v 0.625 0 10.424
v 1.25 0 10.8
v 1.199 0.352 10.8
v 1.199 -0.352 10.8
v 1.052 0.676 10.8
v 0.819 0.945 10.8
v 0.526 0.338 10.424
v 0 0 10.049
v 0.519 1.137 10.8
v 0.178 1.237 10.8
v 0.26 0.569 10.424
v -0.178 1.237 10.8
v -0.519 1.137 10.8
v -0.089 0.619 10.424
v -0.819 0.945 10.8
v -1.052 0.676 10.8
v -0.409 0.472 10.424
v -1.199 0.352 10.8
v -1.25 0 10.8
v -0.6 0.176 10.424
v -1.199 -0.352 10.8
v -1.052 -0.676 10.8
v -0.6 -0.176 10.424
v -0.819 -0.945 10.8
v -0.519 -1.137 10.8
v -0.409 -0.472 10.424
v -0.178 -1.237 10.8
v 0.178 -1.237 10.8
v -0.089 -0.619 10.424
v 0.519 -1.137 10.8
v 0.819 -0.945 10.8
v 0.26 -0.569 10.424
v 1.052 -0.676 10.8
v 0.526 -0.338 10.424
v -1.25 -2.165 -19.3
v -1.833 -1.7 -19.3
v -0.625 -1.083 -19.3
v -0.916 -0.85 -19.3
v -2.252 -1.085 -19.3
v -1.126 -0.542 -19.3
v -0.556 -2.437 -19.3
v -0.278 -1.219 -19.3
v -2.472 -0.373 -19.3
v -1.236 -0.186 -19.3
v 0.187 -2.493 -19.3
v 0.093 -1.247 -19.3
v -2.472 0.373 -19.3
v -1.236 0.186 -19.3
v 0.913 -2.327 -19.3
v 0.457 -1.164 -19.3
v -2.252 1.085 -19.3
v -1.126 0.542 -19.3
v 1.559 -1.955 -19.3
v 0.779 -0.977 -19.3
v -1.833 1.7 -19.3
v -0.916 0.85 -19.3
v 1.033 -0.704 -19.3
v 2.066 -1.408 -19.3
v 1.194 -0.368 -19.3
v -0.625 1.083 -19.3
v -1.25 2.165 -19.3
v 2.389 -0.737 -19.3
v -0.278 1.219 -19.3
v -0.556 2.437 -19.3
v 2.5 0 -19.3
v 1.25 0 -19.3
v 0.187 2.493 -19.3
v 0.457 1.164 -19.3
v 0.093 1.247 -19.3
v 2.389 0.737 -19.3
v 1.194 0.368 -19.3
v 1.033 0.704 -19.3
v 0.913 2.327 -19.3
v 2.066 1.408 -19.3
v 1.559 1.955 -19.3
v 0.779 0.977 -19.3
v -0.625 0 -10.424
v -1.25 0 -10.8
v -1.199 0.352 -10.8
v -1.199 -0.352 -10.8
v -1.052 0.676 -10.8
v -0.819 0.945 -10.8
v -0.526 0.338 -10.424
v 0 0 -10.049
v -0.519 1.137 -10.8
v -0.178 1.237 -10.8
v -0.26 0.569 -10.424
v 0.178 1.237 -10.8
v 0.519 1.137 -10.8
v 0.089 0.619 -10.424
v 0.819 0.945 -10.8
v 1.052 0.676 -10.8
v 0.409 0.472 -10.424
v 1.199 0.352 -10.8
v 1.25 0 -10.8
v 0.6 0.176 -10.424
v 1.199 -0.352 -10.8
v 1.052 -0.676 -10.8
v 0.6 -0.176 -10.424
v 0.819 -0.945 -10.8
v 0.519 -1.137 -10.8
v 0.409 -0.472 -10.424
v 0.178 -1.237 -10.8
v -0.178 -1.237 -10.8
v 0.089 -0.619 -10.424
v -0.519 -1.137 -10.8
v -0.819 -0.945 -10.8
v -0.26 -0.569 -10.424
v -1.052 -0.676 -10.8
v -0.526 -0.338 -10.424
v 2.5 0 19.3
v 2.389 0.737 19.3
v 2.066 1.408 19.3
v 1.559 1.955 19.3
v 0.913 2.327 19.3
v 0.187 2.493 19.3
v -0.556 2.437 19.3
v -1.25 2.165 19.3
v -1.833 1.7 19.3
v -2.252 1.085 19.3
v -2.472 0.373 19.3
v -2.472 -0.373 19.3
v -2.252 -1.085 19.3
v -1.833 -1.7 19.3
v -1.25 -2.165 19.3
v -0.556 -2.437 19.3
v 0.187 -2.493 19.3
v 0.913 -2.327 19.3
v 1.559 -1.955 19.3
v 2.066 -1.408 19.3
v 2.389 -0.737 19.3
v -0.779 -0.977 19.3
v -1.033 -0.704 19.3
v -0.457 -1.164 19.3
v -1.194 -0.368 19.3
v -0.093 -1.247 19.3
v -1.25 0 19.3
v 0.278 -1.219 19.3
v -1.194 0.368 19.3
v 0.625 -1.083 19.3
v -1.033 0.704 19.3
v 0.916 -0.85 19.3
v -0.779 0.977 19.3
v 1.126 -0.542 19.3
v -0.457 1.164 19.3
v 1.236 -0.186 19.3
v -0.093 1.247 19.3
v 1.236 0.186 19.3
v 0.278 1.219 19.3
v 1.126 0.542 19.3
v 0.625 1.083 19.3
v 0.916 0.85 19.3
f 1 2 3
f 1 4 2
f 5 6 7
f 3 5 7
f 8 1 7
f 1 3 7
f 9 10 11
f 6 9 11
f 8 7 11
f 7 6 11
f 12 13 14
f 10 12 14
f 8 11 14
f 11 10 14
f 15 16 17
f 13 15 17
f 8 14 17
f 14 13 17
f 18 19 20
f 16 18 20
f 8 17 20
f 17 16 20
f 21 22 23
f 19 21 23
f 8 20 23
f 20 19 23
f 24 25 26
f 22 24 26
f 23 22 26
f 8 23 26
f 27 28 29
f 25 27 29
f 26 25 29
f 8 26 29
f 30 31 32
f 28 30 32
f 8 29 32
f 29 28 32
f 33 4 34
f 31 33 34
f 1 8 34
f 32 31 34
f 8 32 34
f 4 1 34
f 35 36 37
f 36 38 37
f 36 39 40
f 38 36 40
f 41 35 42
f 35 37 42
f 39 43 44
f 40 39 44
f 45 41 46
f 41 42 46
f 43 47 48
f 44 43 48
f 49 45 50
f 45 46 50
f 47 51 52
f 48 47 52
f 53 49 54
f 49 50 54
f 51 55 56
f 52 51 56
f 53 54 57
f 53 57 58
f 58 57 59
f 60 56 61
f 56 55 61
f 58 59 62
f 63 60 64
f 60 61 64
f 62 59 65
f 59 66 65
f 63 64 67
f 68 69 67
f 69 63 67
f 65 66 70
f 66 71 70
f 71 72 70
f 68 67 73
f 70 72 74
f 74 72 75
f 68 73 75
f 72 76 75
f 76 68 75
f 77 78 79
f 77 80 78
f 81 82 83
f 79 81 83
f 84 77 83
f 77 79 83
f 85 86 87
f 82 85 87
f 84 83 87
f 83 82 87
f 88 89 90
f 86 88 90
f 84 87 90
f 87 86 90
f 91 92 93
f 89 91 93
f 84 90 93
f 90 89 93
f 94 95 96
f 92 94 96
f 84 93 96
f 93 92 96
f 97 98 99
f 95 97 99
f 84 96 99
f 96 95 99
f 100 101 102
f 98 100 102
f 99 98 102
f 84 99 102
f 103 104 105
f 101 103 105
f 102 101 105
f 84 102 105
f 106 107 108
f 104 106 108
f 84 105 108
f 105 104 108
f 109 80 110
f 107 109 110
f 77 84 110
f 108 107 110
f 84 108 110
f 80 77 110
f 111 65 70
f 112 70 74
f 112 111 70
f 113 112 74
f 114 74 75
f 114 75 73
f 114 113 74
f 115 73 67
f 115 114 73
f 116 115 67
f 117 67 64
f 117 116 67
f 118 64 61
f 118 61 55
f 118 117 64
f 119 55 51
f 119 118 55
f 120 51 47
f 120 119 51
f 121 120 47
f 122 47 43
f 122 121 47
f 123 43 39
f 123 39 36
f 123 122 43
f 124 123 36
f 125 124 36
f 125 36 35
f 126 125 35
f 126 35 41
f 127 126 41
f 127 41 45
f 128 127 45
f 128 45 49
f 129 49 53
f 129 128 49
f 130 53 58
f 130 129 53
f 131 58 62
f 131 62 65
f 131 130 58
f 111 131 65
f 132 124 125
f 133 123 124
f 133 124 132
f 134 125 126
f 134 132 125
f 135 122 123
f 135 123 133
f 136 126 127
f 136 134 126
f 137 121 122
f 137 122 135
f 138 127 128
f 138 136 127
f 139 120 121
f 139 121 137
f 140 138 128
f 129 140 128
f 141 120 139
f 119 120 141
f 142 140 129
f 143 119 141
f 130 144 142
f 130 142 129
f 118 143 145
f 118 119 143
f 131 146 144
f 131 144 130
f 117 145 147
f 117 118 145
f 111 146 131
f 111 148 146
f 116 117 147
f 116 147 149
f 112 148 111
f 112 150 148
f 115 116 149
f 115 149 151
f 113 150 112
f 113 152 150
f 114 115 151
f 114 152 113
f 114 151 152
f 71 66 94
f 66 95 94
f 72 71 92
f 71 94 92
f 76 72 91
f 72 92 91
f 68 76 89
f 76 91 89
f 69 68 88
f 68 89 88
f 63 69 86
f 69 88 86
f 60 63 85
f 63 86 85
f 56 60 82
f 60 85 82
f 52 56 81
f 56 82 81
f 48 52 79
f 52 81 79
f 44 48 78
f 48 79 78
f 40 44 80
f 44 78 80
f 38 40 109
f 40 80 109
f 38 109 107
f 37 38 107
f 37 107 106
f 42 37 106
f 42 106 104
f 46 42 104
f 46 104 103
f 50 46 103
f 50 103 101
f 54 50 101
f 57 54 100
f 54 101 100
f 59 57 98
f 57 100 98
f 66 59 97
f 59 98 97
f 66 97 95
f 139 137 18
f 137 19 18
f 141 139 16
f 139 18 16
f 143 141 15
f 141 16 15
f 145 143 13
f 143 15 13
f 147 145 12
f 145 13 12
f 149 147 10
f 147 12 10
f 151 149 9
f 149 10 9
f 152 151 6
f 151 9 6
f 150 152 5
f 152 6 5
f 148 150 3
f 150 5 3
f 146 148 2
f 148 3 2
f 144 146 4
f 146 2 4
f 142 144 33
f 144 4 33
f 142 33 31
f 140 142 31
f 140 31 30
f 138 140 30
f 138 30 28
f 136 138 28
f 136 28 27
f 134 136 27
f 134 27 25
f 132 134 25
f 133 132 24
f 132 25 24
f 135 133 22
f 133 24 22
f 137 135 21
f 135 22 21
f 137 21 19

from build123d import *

# Parameters (mm, degrees)
SKETCH_6_R               = 2.5
EXTRUDE_2_DEPTH          = 19.3
M3X0_5_3_D               = 2.5
M3X0_5_3_DEPTH           = 8.5
M3X0_5_3_TIP             = 0.751075774
M3X0_5_3_ON_FACE_2_D     = 2.5
M3X0_5_3_ON_FACE_2_DEPTH = 8.5
M3X0_5_3_ON_FACE_2_TIP   = 0.751075774


with BuildPart() as part:
    # ｽｹｯﾁ6 → ﾎﾞｽ - 押し出し2 (new body, symmetric)
    with BuildSketch(Plane.XY):
        Circle(SKETCH_6_R)
    extrude(amount=EXTRUDE_2_DEPTH, both=True)

    # M3x0.5 ねじ穴3
    with Locations(Plane.XY.offset(19.3)):
        with Locations((0, 0)):
            Hole(M3X0_5_3_D / 2, depth=M3X0_5_3_DEPTH)
            with Locations((0, 0, -(M3X0_5_3_DEPTH + M3X0_5_3_TIP / 2))):  # 118° drill point
                Cone(0, M3X0_5_3_D / 2, M3X0_5_3_TIP, mode=Mode.SUBTRACT)

    # M3x0.5 ねじ穴3 on face 2
    with Locations(Plane(origin=(0, 0, -19.3), x_dir=(-1, 0, 0), z_dir=(0, 0, -1))):
        with Locations((0, 0)):
            Hole(M3X0_5_3_ON_FACE_2_D / 2, depth=M3X0_5_3_ON_FACE_2_DEPTH)
            with Locations((0, 0, -(M3X0_5_3_ON_FACE_2_DEPTH + M3X0_5_3_ON_FACE_2_TIP / 2))):  # 118° drill point
                Cone(0, M3X0_5_3_ON_FACE_2_D / 2, M3X0_5_3_ON_FACE_2_TIP, mode=Mode.SUBTRACT)


solid = part.part
